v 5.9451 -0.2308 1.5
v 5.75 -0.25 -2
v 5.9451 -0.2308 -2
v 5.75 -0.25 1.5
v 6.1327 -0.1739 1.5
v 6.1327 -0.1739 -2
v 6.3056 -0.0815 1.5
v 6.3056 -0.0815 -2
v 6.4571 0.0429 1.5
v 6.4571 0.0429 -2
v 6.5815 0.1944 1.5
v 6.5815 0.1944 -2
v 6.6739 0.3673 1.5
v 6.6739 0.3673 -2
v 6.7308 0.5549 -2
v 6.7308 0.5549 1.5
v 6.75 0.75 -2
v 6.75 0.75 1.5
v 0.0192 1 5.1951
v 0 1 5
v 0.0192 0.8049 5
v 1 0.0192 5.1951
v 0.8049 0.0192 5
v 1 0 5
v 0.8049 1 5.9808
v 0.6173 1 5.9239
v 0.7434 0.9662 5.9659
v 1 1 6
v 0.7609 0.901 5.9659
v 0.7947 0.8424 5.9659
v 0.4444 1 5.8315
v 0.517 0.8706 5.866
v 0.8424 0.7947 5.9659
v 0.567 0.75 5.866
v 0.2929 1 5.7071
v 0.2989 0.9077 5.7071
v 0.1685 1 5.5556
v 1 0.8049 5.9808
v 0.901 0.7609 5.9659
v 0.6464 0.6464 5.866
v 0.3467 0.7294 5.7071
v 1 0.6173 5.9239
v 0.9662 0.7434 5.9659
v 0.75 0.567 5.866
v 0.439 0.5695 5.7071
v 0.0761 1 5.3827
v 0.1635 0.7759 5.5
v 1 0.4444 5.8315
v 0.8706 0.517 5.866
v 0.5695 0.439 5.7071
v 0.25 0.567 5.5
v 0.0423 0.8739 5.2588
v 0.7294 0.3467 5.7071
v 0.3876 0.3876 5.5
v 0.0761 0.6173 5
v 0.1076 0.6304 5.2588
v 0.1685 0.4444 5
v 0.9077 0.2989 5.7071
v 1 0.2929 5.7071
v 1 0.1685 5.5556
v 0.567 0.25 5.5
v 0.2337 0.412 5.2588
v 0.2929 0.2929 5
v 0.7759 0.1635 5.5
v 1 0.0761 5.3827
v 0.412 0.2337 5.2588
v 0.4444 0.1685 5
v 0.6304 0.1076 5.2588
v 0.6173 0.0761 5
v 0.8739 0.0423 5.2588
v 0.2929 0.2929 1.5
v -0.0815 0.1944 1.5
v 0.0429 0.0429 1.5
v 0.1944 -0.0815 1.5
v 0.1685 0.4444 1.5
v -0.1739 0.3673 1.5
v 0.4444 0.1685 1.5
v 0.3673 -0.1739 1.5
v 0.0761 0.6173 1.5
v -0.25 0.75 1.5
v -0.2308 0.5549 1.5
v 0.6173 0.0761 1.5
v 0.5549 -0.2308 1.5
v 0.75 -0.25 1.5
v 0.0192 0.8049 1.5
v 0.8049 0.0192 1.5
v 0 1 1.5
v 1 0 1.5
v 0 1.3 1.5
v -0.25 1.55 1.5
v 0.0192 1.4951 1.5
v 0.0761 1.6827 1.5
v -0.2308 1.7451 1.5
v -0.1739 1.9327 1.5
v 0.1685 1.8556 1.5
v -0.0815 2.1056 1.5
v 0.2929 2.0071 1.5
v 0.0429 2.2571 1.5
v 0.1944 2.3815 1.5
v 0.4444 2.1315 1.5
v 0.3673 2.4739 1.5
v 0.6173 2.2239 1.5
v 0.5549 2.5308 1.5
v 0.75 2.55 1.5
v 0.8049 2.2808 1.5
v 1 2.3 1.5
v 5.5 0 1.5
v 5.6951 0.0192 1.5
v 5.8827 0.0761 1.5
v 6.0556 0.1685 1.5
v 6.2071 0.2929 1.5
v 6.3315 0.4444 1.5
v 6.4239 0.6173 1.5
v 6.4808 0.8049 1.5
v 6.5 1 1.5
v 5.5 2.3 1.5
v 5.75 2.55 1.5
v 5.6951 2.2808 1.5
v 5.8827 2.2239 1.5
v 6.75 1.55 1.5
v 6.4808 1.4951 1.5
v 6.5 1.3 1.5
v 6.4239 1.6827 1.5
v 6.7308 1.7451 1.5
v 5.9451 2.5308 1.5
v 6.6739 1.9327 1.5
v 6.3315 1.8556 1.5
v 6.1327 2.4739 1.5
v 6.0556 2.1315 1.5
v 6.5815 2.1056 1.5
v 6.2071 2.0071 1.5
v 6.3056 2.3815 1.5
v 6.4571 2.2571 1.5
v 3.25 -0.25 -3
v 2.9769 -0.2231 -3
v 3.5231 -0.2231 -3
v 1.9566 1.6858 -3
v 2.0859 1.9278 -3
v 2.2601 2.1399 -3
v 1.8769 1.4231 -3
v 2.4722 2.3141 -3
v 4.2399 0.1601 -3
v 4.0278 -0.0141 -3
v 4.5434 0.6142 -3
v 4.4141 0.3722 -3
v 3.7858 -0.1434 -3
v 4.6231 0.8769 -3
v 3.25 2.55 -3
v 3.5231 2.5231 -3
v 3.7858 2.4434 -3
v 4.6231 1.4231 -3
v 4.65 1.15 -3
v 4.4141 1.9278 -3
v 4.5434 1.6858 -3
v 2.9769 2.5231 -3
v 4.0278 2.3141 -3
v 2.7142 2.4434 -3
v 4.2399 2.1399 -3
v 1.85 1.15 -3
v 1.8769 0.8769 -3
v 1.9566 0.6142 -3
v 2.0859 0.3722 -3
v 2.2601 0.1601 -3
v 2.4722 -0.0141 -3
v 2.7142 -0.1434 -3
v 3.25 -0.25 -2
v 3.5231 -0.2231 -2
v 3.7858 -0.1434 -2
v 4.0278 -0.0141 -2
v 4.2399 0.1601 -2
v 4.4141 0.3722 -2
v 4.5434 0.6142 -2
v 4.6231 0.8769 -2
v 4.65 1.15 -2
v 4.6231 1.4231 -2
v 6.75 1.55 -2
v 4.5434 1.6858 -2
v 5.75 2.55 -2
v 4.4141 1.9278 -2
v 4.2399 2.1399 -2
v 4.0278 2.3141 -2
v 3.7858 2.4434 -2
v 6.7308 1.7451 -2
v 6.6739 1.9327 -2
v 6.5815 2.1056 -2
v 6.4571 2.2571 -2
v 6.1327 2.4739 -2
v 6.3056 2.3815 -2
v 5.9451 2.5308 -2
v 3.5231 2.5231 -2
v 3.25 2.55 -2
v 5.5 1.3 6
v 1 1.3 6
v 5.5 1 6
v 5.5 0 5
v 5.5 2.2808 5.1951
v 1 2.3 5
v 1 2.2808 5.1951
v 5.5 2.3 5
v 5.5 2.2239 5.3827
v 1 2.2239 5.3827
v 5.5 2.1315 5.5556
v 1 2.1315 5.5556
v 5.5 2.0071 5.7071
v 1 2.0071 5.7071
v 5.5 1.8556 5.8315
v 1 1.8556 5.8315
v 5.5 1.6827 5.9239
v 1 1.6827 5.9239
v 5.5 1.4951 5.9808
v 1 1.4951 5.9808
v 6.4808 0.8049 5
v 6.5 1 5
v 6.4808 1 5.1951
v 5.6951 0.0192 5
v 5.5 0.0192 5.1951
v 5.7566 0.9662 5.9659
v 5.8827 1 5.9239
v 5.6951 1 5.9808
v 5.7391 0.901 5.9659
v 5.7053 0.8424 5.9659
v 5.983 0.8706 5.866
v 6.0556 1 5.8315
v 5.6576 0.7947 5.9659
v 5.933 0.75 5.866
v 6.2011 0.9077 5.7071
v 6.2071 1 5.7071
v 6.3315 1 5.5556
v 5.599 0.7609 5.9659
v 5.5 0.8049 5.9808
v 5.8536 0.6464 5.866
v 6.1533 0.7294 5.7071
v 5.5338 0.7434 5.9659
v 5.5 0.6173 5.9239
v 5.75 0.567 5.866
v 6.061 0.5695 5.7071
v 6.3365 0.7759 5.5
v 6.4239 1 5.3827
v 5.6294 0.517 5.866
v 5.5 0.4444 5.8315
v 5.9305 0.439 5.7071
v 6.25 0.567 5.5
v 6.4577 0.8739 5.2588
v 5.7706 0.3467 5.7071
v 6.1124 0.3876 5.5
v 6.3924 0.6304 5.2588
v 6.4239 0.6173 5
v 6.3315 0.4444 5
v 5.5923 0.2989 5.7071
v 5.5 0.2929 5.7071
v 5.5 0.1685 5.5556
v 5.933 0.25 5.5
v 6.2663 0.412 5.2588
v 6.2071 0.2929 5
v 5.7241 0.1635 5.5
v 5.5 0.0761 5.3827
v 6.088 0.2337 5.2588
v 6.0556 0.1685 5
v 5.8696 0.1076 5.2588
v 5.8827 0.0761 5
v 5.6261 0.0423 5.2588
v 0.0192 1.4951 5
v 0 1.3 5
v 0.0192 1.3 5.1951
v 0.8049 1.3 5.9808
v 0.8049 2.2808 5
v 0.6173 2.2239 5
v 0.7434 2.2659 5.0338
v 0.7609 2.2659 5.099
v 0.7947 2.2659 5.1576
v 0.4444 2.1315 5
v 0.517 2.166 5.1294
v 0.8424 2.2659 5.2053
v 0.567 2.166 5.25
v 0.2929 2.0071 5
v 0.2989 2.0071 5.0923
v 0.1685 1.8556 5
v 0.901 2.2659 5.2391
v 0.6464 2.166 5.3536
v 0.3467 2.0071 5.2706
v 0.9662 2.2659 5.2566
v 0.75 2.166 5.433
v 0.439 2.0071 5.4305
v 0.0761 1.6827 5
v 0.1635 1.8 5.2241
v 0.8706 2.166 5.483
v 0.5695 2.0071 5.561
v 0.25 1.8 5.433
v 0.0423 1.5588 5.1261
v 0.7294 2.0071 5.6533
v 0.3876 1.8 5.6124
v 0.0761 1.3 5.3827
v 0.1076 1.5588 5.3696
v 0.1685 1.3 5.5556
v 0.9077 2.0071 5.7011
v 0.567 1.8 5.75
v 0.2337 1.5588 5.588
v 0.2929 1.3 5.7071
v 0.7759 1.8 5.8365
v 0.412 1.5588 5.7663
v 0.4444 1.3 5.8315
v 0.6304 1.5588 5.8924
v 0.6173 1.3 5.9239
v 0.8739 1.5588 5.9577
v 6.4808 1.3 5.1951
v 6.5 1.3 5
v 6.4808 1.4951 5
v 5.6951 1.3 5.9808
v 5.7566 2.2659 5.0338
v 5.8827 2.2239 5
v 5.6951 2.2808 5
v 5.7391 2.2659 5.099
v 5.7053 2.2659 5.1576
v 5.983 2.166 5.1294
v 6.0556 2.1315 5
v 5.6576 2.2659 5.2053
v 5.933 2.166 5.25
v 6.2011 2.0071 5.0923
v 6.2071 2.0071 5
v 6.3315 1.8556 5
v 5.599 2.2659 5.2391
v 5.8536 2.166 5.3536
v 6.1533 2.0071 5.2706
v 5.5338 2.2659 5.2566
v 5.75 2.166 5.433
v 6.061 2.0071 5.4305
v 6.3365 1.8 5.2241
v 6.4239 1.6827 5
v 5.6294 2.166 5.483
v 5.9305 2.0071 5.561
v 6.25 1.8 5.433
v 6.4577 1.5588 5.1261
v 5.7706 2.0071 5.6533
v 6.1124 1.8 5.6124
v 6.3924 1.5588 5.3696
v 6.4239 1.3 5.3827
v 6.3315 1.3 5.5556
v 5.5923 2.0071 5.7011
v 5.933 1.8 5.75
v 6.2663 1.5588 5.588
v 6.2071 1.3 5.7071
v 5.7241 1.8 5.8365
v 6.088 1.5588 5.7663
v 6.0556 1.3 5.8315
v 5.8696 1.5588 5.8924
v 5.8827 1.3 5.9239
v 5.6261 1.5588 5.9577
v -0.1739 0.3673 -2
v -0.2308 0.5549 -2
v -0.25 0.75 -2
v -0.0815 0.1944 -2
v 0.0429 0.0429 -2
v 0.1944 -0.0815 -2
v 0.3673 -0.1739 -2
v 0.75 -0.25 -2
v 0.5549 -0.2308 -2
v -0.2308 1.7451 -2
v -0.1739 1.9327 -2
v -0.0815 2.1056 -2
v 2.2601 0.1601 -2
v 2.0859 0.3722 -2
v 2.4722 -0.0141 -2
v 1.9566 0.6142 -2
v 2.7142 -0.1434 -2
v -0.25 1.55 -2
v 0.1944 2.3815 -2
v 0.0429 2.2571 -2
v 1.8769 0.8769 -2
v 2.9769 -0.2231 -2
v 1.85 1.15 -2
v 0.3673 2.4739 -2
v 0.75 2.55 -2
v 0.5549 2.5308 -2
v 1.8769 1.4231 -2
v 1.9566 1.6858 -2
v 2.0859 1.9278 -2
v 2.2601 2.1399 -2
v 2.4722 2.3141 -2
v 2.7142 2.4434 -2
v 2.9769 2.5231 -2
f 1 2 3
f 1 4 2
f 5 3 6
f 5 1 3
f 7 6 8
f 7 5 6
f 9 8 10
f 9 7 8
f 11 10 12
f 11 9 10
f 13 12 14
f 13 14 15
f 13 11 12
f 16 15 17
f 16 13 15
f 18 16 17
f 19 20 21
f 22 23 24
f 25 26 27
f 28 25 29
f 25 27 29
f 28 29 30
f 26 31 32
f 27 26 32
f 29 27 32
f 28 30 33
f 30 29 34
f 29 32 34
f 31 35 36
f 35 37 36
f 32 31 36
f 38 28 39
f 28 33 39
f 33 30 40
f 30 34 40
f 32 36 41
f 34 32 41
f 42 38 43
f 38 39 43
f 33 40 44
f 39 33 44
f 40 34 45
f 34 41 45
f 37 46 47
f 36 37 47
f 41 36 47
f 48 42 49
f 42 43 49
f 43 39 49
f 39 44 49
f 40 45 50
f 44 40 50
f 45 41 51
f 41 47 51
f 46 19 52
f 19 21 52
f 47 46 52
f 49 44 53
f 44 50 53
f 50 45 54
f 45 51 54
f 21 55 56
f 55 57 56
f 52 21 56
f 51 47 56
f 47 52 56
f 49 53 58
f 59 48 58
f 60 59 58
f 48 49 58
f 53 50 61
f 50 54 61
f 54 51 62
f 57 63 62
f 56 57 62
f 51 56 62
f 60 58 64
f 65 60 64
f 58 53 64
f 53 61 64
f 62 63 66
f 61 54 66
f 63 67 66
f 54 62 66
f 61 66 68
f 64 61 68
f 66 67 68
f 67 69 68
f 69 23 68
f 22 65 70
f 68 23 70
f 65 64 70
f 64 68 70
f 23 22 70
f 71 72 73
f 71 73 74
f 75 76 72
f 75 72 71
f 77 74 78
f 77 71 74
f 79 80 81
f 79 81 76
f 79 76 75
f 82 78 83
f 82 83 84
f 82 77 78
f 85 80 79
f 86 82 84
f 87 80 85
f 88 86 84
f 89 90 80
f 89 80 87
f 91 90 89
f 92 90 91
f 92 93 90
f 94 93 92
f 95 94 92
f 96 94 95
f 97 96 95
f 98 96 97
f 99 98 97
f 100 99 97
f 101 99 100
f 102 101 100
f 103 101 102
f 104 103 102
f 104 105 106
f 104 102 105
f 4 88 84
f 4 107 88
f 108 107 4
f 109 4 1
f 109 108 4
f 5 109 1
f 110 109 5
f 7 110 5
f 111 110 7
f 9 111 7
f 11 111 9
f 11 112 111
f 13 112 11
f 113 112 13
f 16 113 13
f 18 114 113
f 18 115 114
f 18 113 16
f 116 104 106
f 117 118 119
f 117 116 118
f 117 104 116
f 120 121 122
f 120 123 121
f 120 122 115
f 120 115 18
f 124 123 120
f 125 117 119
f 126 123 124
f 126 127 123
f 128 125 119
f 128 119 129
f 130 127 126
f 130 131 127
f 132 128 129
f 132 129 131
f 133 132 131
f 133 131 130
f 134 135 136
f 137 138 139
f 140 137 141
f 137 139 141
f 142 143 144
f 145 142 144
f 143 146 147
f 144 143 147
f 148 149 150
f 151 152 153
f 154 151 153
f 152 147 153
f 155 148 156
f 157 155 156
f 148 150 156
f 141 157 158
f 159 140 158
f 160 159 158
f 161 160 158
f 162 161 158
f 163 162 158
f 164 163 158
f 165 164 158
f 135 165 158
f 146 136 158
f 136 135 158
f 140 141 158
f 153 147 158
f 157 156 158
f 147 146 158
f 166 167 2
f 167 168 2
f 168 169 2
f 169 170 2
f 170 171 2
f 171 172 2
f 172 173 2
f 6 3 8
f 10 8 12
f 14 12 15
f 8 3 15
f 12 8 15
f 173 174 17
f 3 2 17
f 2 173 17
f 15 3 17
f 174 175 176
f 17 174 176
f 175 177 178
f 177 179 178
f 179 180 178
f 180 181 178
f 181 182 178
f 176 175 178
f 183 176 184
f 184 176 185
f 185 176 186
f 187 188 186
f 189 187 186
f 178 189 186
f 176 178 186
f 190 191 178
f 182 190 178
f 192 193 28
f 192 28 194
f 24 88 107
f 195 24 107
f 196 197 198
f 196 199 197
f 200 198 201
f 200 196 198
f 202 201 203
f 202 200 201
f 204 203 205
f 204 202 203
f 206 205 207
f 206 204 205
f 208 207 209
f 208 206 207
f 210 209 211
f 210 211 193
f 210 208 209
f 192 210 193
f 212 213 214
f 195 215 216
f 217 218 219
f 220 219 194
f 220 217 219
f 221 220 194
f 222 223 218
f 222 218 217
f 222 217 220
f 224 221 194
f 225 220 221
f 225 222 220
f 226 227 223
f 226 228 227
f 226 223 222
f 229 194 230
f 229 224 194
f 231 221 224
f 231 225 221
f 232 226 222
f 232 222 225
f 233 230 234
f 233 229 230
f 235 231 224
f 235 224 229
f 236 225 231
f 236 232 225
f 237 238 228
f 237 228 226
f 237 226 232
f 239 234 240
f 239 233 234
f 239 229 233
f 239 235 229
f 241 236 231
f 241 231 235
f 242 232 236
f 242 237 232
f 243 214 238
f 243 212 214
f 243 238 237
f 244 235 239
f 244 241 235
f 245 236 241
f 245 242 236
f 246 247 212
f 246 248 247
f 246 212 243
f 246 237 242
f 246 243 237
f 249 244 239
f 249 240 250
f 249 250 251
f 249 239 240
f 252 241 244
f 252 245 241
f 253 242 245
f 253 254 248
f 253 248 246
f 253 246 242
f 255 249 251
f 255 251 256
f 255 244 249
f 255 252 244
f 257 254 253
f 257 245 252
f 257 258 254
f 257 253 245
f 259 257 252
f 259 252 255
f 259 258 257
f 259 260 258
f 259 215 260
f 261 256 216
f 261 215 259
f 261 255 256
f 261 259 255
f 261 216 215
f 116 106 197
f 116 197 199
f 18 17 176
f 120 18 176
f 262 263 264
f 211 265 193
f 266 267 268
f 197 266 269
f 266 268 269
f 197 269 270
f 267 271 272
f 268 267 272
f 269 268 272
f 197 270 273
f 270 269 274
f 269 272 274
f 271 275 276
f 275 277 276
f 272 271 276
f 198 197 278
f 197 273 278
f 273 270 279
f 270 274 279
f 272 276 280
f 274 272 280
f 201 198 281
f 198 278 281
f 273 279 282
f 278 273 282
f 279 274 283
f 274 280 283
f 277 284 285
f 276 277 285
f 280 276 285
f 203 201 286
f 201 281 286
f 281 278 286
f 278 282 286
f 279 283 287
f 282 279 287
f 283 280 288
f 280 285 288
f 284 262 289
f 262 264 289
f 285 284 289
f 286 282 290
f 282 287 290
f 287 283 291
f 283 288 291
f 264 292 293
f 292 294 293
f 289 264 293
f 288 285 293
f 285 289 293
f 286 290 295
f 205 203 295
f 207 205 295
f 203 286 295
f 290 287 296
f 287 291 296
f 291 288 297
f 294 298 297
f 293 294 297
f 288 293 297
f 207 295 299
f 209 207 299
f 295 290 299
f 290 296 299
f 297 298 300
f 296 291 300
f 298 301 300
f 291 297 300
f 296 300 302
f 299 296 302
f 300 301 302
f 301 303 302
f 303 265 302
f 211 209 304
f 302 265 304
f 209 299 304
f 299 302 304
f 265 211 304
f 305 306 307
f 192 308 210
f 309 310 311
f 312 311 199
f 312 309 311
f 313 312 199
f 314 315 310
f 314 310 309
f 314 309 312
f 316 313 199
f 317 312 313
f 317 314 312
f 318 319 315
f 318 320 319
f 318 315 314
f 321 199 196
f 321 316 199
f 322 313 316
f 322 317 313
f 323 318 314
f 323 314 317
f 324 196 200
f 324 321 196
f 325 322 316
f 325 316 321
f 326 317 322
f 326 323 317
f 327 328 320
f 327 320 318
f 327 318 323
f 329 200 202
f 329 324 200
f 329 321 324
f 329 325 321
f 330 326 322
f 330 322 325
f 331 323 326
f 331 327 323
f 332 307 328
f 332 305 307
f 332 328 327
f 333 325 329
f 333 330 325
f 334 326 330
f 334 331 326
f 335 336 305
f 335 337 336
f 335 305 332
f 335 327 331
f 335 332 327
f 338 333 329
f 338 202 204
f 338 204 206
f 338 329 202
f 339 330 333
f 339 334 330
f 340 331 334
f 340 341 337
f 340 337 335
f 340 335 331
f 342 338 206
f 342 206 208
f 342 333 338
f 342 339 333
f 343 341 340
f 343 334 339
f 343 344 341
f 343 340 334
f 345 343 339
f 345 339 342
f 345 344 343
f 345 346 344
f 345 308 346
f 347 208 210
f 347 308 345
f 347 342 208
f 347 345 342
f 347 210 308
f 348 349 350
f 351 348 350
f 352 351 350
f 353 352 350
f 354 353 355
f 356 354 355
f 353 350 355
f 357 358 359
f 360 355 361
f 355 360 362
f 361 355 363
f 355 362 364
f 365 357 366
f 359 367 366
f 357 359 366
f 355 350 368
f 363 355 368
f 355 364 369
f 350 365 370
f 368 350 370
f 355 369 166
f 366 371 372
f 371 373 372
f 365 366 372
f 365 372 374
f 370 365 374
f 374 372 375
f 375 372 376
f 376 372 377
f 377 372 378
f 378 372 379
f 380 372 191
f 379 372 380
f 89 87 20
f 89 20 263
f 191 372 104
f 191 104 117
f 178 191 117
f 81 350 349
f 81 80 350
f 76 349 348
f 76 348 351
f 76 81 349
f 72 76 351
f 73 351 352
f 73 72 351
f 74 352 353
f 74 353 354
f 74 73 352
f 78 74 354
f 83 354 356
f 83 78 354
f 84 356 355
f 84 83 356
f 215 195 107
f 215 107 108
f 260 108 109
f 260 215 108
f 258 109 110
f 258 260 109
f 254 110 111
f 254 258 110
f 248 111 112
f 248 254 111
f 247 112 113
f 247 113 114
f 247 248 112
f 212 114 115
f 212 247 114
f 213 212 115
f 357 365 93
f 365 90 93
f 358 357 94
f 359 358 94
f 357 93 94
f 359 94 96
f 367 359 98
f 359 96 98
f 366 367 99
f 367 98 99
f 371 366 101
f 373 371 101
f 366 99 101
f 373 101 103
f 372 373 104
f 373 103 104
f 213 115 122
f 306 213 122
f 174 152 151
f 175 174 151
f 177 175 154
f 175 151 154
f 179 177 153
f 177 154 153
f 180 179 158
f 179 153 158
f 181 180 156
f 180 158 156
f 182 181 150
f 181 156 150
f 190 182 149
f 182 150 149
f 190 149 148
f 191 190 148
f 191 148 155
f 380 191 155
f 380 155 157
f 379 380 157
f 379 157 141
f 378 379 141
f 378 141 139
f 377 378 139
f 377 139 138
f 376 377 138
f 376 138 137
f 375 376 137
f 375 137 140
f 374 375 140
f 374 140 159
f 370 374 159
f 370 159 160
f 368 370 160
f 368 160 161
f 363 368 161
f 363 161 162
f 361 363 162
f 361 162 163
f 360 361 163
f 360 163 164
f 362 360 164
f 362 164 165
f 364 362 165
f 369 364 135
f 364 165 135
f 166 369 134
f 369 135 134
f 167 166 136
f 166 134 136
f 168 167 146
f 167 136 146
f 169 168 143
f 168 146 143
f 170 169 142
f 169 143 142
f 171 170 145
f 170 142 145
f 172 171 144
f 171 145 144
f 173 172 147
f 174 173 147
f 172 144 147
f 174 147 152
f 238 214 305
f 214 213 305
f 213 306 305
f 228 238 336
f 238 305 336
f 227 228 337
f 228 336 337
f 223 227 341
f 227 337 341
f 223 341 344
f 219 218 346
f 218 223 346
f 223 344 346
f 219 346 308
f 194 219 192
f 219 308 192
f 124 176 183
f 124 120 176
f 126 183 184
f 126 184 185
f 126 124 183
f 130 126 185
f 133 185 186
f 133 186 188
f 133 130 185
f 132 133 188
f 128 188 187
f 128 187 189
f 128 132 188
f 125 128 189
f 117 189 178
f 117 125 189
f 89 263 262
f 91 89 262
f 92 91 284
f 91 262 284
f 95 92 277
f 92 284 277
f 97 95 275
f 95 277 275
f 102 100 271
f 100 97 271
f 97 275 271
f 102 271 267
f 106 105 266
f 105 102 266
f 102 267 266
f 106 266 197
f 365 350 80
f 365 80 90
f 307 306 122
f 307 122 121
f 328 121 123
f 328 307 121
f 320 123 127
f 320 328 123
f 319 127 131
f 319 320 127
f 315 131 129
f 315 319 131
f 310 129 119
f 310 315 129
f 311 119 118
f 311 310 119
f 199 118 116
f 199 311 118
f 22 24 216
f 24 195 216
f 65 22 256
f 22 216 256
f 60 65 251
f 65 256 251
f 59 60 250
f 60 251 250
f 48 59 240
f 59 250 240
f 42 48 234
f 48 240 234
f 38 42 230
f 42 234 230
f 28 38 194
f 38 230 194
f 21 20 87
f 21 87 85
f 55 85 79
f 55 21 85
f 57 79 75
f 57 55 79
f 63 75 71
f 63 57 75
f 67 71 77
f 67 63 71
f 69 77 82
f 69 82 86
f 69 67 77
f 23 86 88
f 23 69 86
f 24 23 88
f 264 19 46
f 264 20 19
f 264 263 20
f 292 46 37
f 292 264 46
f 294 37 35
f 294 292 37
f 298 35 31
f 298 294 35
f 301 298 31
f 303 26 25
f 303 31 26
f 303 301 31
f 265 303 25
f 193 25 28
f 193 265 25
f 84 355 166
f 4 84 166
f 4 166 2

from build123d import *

# Parameters (mm, degrees)
BOX001_W       = 7
BOX001_H       = 2.8
BOX001_DEPTH   = 3.5
FILLET001_R    = 1
CYLINDER_R     = 1.4
CYLINDER_DEPTH = 1
BOX_W          = 6.5
BOX_H          = 2.3
BOX_DEPTH      = 6
FILLET_R       = 1


with BuildPart() as fillet001:
    # Box001 → Box001 (new body)
    with BuildSketch(Plane(origin=(-0.25, -0.25, -2), x_dir=(1, 0, 0), z_dir=(0, 0, 1))):
        with Locations((3.5, 1.4)):
            Rectangle(BOX001_W, BOX001_H)
    extrude(amount=BOX001_DEPTH)

    # Fillet001
    fillet001_edges = [fillet001.edges().sort_by_distance(p)[0] for p in [
        (-0.25, -0.25, -0.25),
        (-0.25, 2.55, -0.25),
        (6.75, -0.25, -0.25),
        (6.75, 2.55, -0.25),
    ]]
    fillet(fillet001_edges, radius=FILLET001_R)


with BuildPart() as cylinder:
    # Cylinder → Cylinder (new body)
    with BuildSketch(Plane(origin=(3.25, 1.15, -3), x_dir=(1, 0, 0), z_dir=(0, 0, 1))):
        Circle(CYLINDER_R)
    extrude(amount=CYLINDER_DEPTH)


with BuildPart() as fusion:
    # Box → Box (new body)
    with BuildSketch(Plane.XY):
        with Locations((3.25, 1.15)):
            Rectangle(BOX_W, BOX_H)
    extrude(amount=BOX_DEPTH)

    # Fillet
    fillet_edges = [fusion.edges().sort_by_distance(p)[0] for p in [
        (0, 0, 3),
        (0, 1.15, 6),
        (0, 2.3, 3),
        (6.5, 0, 3),
        (6.5, 1.15, 6),
        (6.5, 2.3, 3),
        (3.25, 0, 6),
        (3.25, 2.3, 6),
    ]]
    fillet(fillet_edges, radius=FILLET_R)

    # Fusion: union Fillet001, Cylinder
    add(fillet001.part)
    add(cylinder.part)


solid = fusion.part
